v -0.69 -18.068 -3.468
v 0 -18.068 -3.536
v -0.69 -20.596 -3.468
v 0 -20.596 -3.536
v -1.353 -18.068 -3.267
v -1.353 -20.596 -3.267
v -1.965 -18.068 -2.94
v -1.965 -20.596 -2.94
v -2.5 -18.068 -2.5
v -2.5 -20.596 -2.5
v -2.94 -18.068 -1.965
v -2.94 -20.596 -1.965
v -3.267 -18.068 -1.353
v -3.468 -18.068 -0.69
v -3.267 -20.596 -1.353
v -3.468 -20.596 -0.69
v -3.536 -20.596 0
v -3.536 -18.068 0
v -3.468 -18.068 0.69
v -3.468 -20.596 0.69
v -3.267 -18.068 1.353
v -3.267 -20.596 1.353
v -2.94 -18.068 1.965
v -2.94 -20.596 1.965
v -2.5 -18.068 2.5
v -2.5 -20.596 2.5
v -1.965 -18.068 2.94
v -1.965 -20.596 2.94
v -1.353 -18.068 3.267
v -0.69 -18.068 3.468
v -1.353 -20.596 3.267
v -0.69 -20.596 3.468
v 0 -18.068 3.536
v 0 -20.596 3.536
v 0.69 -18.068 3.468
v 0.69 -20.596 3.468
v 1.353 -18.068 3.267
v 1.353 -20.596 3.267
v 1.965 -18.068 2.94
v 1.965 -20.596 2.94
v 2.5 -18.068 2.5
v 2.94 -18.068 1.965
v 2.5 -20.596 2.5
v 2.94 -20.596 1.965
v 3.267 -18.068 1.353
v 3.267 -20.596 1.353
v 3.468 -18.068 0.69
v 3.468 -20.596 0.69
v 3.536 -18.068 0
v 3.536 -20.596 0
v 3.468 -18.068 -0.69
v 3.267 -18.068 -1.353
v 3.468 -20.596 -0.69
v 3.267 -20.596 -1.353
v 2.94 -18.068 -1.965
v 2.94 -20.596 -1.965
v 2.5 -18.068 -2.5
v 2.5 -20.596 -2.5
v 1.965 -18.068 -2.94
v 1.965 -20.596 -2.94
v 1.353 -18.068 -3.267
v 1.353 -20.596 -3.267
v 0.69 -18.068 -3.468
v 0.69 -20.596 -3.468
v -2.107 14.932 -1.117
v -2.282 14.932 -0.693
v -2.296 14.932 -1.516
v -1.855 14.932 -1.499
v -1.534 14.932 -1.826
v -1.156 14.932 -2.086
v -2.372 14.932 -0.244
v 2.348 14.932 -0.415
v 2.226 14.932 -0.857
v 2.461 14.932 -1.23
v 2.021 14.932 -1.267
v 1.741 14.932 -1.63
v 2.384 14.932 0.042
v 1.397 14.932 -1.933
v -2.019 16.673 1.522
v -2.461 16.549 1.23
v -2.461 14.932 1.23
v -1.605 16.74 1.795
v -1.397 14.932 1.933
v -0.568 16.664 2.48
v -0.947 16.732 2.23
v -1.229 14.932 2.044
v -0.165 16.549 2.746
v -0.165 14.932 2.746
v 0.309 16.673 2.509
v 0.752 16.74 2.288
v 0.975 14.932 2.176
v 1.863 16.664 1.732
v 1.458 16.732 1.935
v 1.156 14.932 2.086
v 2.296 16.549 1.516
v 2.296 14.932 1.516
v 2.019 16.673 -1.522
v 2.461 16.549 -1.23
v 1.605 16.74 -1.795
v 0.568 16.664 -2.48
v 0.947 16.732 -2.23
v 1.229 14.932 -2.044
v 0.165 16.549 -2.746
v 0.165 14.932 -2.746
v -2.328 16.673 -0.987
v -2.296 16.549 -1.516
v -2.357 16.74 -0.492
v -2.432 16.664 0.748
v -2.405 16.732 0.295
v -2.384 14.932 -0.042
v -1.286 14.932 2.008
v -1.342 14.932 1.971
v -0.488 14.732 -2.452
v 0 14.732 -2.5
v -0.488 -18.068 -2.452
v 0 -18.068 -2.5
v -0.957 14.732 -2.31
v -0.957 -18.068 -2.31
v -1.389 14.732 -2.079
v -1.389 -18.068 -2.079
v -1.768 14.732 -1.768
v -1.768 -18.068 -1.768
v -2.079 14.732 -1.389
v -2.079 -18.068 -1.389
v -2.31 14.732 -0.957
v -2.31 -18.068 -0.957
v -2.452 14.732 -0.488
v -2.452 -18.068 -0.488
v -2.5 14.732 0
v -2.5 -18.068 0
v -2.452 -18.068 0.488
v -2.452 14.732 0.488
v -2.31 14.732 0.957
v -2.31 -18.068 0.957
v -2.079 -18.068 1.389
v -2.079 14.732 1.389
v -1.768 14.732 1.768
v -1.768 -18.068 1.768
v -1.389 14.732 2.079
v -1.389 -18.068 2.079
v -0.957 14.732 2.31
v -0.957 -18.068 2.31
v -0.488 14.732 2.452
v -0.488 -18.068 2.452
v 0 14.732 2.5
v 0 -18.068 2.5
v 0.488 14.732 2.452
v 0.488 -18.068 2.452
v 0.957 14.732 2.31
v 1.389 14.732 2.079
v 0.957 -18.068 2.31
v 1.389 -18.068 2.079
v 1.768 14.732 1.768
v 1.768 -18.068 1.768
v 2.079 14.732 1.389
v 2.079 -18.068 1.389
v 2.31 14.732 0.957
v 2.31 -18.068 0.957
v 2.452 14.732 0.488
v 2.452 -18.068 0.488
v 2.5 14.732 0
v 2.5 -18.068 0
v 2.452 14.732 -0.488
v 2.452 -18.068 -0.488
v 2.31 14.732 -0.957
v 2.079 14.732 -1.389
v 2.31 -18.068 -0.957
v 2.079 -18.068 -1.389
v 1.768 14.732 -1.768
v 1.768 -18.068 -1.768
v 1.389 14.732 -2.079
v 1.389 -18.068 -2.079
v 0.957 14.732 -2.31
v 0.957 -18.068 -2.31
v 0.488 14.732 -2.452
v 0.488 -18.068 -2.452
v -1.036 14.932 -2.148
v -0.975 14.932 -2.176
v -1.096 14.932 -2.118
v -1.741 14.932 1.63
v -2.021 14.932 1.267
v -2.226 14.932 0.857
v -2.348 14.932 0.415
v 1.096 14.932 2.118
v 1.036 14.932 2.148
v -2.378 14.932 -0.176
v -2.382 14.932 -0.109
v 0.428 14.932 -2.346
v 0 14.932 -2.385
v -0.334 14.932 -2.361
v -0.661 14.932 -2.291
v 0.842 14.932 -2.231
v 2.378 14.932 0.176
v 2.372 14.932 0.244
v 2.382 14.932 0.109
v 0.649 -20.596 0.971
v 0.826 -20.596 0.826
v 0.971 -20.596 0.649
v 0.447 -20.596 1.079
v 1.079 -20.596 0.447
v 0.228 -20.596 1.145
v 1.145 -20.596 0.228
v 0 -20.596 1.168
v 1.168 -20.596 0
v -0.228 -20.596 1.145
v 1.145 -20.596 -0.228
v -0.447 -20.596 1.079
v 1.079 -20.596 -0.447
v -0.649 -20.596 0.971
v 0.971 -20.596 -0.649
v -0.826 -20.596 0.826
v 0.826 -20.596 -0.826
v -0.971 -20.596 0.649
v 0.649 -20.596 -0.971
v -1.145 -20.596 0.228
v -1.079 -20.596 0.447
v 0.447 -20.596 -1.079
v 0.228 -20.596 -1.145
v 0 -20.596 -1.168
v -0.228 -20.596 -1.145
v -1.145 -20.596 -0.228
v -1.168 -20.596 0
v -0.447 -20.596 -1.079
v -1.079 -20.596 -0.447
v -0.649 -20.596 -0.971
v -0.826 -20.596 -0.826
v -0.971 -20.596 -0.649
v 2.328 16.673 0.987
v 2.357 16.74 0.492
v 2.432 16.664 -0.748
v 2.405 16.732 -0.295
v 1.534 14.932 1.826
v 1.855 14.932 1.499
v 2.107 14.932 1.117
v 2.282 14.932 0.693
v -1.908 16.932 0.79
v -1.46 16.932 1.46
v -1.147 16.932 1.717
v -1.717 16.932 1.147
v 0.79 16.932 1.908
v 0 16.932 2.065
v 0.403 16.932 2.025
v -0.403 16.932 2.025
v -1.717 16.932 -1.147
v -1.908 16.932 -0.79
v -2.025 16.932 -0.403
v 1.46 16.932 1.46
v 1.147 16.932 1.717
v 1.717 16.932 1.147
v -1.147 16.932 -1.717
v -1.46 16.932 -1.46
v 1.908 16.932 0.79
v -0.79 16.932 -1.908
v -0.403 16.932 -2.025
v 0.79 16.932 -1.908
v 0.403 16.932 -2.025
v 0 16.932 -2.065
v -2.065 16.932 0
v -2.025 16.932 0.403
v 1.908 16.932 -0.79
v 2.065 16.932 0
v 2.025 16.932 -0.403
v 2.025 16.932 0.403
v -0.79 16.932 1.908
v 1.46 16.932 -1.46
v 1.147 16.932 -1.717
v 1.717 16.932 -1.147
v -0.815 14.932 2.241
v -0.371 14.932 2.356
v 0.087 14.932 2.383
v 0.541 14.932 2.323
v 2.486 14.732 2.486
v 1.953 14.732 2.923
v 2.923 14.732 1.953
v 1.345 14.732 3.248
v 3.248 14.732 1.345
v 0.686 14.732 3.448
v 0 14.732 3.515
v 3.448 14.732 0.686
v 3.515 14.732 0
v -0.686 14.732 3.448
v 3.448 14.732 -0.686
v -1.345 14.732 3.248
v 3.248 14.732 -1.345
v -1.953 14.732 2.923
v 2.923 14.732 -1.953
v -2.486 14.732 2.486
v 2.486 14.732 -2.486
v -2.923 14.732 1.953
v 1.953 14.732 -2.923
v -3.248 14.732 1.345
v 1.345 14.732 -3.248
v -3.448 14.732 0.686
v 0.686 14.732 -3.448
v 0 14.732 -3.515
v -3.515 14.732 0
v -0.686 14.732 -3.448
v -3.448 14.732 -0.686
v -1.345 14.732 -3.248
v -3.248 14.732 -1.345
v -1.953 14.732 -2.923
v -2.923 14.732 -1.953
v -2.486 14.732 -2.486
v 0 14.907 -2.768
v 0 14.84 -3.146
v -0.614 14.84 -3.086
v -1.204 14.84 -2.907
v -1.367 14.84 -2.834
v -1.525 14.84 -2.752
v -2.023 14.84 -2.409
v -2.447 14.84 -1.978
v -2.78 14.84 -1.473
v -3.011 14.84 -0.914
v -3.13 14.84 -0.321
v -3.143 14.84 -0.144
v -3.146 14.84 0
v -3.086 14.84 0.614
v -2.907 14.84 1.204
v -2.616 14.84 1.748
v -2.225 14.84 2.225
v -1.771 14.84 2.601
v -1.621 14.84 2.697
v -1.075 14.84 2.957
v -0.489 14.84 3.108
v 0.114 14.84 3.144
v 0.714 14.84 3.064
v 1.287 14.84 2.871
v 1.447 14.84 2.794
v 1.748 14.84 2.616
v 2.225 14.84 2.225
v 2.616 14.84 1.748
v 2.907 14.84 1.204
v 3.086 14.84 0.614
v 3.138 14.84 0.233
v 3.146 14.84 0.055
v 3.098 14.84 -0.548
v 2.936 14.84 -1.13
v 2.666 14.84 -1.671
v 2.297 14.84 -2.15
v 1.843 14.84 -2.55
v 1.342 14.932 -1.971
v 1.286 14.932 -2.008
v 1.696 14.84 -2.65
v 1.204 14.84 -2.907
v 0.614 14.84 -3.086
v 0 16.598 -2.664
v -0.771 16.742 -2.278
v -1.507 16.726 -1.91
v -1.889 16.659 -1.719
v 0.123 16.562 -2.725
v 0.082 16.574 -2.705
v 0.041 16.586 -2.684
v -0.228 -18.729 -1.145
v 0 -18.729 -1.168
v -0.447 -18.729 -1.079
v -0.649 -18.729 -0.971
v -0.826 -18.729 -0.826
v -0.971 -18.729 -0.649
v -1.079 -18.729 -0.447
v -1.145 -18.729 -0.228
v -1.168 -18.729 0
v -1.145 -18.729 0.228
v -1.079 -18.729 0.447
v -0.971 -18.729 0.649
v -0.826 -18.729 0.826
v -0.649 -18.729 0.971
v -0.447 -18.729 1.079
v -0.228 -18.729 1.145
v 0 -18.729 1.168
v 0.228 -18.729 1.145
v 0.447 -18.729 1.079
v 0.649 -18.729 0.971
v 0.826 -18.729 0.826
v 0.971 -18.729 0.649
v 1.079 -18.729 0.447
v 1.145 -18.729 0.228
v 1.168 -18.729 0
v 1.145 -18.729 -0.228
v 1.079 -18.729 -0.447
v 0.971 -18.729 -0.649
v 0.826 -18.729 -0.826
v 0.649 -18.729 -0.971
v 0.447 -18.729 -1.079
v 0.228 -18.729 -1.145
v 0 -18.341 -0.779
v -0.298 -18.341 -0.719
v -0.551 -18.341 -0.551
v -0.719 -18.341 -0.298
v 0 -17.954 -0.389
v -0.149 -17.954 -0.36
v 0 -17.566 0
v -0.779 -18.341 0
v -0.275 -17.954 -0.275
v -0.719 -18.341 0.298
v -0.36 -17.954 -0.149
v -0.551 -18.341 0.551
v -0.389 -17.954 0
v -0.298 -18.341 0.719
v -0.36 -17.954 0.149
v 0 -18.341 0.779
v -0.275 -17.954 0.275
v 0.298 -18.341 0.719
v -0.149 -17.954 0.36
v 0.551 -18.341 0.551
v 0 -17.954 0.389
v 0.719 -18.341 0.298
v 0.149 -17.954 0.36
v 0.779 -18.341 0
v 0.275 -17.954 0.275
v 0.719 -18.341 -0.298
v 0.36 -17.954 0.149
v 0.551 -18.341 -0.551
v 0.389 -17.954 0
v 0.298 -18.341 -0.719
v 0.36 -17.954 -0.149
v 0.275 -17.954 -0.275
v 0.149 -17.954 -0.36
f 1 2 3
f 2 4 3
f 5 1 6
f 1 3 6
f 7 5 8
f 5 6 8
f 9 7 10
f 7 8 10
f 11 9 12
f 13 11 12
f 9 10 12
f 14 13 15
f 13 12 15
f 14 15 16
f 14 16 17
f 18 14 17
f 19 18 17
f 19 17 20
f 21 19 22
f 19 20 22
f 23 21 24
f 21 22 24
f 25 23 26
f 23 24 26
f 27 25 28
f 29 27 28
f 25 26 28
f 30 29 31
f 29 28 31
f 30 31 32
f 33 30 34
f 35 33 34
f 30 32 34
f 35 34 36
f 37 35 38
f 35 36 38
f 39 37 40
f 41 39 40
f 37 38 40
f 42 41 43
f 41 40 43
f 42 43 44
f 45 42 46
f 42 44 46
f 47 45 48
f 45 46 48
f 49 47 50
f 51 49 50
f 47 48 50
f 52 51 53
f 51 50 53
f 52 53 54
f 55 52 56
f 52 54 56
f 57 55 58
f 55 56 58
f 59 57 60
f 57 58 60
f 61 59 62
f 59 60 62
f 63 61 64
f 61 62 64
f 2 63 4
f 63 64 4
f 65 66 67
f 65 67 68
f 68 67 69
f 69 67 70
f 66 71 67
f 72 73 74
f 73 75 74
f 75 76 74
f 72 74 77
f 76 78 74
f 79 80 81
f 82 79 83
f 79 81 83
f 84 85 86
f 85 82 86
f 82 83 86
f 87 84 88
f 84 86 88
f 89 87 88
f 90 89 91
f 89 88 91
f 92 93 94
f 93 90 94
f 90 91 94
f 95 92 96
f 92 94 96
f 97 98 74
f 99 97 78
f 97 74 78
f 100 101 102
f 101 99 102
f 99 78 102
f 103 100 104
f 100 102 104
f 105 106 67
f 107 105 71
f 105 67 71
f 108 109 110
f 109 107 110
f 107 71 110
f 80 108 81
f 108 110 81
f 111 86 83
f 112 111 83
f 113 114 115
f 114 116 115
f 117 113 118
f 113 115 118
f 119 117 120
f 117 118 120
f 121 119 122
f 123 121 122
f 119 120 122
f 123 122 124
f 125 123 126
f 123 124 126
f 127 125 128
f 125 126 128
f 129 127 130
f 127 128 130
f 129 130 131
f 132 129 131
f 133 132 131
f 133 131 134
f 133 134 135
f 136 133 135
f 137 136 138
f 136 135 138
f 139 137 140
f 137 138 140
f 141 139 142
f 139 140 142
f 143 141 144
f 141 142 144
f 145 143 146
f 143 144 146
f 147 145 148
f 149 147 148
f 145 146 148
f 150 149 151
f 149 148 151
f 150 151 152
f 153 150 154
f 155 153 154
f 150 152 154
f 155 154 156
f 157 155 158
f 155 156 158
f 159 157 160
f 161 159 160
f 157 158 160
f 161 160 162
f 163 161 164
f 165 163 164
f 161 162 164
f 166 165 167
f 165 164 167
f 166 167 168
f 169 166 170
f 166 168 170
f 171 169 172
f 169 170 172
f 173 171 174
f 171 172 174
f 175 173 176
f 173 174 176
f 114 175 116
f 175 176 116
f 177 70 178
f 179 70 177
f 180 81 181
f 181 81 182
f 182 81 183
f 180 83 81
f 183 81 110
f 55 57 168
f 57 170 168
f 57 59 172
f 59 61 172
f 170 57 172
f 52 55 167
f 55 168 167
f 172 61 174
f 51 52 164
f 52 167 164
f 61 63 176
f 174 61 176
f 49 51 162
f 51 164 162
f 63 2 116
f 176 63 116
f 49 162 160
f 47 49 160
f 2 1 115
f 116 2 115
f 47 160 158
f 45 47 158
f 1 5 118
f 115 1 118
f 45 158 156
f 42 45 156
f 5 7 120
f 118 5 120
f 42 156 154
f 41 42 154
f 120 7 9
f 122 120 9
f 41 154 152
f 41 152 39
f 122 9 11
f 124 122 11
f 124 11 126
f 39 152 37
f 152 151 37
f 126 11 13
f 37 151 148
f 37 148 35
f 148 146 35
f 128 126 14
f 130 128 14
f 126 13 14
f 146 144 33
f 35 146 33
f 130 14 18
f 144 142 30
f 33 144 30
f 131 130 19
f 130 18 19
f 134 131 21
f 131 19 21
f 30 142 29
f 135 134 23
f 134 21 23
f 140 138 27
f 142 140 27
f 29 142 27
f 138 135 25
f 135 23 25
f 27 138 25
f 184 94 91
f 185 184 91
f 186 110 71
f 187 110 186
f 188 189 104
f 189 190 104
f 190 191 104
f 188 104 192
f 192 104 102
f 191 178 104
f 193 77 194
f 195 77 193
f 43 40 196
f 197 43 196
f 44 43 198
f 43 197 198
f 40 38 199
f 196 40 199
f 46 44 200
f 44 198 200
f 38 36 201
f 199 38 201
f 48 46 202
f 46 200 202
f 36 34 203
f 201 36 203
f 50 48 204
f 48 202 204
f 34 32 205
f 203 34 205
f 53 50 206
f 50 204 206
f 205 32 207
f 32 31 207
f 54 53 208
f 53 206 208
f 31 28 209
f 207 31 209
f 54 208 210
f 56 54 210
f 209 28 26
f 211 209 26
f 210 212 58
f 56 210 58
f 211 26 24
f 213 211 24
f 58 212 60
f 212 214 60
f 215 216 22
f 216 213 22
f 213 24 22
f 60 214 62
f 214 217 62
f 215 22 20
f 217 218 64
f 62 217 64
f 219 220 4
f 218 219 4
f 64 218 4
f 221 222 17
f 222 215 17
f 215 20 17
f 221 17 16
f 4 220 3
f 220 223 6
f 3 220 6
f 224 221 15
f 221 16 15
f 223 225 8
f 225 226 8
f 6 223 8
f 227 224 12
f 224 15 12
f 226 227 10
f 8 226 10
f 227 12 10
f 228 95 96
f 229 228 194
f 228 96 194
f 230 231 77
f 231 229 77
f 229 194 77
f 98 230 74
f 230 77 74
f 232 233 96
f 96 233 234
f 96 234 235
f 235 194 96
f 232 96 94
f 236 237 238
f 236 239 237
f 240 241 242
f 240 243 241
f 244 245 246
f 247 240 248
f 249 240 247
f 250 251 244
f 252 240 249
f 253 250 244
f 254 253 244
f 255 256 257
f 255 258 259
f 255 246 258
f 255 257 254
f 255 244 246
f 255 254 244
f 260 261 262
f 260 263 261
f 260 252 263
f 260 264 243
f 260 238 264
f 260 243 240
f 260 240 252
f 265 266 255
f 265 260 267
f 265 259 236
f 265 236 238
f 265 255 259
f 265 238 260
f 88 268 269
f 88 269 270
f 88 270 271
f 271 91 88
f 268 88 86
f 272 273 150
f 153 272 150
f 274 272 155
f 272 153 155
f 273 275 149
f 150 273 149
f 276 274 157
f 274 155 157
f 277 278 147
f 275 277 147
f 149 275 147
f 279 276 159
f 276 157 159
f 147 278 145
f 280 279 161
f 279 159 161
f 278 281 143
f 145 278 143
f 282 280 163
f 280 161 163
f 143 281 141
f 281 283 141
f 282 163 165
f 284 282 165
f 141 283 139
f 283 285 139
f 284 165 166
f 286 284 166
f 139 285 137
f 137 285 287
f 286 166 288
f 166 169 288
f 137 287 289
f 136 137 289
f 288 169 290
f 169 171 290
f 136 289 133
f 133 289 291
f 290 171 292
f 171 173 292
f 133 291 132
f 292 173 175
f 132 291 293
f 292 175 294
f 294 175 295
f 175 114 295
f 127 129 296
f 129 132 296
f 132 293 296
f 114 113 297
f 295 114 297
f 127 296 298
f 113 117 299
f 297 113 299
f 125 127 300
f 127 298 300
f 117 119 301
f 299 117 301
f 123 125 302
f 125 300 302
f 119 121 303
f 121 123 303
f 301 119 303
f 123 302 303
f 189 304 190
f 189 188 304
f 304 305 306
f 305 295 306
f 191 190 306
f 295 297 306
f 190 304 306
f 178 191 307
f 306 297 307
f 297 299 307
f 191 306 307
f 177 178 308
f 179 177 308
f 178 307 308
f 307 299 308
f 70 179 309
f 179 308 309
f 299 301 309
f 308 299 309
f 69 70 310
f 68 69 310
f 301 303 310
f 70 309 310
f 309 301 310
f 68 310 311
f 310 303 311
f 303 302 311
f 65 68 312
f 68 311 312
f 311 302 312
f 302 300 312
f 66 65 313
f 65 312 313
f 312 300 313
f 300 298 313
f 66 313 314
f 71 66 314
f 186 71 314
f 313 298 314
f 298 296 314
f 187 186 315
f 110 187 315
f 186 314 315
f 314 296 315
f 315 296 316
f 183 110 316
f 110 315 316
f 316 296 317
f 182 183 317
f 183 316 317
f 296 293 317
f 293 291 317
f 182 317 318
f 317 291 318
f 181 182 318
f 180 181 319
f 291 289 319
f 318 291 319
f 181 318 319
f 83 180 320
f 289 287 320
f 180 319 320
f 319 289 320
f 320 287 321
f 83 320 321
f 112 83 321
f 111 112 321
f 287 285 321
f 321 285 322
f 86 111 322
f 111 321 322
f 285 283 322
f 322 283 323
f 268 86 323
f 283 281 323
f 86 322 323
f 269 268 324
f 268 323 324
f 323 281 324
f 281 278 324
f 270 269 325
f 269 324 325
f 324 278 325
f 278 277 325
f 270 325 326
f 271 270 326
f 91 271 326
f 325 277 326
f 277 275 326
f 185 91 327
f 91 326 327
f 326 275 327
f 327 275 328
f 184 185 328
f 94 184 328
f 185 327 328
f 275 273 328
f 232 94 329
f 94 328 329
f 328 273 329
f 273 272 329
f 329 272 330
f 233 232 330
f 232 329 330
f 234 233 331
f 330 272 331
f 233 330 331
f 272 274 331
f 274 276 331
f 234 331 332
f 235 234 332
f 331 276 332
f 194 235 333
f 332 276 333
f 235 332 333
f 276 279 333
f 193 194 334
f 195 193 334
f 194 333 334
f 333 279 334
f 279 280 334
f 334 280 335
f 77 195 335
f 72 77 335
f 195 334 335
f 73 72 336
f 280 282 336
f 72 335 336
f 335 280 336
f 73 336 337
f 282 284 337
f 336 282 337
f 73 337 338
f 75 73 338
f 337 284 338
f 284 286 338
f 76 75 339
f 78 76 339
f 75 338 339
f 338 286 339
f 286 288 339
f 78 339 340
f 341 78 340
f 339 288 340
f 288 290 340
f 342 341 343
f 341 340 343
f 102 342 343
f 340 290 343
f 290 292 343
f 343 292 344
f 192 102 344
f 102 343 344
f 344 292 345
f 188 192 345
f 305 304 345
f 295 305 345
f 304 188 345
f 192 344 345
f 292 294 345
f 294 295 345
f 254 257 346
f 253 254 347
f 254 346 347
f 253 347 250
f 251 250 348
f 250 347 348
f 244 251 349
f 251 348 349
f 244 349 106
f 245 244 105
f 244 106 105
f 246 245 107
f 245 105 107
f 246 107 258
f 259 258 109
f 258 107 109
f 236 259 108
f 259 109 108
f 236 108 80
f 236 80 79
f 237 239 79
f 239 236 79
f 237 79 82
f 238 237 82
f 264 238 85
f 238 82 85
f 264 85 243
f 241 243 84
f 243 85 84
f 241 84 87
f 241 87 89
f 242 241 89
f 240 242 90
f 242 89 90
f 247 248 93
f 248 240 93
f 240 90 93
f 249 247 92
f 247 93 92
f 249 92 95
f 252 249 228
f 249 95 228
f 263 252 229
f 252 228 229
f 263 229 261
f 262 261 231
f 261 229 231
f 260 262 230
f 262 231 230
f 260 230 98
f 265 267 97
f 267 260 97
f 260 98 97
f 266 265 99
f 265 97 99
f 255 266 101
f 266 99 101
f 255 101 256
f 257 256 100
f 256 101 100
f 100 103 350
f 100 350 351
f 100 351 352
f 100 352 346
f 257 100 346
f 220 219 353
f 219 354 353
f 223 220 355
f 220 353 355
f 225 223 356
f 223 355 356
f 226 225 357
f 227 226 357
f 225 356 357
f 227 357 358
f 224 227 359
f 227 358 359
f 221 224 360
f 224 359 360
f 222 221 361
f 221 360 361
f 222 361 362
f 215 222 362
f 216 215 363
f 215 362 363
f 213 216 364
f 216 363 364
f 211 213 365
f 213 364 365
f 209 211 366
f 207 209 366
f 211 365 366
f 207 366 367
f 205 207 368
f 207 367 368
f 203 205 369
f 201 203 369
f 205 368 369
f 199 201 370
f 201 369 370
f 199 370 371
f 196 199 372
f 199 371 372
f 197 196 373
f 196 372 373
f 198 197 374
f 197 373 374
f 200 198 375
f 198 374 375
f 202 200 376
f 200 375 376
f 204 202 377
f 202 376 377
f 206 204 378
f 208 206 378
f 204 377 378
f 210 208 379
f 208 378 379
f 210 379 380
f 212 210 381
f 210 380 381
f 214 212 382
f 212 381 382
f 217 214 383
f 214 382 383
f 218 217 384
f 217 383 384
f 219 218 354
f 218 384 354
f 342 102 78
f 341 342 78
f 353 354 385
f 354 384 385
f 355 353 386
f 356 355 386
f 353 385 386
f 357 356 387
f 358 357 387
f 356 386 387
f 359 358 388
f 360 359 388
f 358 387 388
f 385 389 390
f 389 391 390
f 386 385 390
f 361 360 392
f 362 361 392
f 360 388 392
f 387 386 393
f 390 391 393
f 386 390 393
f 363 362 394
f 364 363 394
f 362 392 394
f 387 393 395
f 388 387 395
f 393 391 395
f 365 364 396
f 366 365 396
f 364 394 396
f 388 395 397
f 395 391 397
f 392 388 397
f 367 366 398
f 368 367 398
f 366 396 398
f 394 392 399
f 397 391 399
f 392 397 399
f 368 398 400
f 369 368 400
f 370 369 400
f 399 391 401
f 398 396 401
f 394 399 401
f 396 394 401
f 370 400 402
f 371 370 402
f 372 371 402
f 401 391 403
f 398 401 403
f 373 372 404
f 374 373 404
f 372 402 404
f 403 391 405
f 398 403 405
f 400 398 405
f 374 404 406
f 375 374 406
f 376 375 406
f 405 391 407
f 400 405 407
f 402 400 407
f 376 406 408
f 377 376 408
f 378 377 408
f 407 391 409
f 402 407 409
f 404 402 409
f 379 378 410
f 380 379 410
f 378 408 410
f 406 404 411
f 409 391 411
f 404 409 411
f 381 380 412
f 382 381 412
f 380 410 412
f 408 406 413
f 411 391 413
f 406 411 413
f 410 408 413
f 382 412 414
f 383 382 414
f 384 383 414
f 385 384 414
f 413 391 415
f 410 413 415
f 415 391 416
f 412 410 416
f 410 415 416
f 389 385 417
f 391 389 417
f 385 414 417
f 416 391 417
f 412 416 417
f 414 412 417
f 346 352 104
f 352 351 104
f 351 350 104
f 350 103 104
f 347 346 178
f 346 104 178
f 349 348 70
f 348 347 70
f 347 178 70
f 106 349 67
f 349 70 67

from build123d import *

# Parameters (mm, degrees)
BOSS_EXTRUDE1_DEPTH = 2


with BuildPart() as part:
    # Sketch1 → Revolve1 (revolve)
    with BuildSketch(Plane.XY, mode=Mode.PRIVATE) as revolve1_sk:
        with BuildLine():
            Line((2.5, 14.732142857), (2.5, -18.067857143))
            Line((2.5, -18.067857143), (3.536022963, -18.067857143))
            Line((3.536022963, -18.067857143), (3.536022963, -20.596420744))
            Line((3.536022963, -20.596420744), (1.167881341, -20.596420744))
            Line((1.167881341, -20.596420744), (1.167881341, -18.729405275))
            Line((1.167881341, -18.729405275), (0, -17.565615784))
            Line((0, -17.565615784), (0, 14.932142857))
            Line((0, 14.932142857), (2.384728147, 14.932142857))
            ThreePointArc((2.384728147, 14.932142857), (2.958117238, 14.87838149), (3.515144703, 14.732142857))
            Line((3.515144703, 14.732142857), (2.5, 14.732142857))
        make_face()
    revolve(revolve1_sk.sketch.rotate(Axis((0, 0, 0), (0, 1, 0)), 90), axis=Axis((0, 0, 0), (0, 1, 0)))

    # Sketch2 → Boss-Extrude1 (add)
    with BuildSketch(Plane(origin=(0, 14.932142857, 0), x_dir=(1, 0, 0), z_dir=(0, 1, 0))):
        Polygon((2.460727115, 1.230363557), (0.164837461, 2.746233972), (-2.295889654, 1.515870415), (-2.460727115, -1.230363557), (-0.164837461, -2.746233972), (2.295889654, -1.515870415), align=None)
    extrude(amount=BOSS_EXTRUDE1_DEPTH)

    # Sketch3 → Cut-Revolve1 (revolve, cut)
    with BuildSketch(Plane.XY, mode=Mode.PRIVATE) as cut_revolve1_sk:
        Polygon((1.455321173, 17.272335871), (3.239619089, 16.276214666), (3.239619089, 17.272335871), align=None)
    revolve(cut_revolve1_sk.sketch.rotate(Axis((0, 14.732142857, 0), (0, 1, 0)), 90), axis=Axis((0, 14.732142857, 0), (0, 1, 0)), mode=Mode.SUBTRACT)


solid = part.part
